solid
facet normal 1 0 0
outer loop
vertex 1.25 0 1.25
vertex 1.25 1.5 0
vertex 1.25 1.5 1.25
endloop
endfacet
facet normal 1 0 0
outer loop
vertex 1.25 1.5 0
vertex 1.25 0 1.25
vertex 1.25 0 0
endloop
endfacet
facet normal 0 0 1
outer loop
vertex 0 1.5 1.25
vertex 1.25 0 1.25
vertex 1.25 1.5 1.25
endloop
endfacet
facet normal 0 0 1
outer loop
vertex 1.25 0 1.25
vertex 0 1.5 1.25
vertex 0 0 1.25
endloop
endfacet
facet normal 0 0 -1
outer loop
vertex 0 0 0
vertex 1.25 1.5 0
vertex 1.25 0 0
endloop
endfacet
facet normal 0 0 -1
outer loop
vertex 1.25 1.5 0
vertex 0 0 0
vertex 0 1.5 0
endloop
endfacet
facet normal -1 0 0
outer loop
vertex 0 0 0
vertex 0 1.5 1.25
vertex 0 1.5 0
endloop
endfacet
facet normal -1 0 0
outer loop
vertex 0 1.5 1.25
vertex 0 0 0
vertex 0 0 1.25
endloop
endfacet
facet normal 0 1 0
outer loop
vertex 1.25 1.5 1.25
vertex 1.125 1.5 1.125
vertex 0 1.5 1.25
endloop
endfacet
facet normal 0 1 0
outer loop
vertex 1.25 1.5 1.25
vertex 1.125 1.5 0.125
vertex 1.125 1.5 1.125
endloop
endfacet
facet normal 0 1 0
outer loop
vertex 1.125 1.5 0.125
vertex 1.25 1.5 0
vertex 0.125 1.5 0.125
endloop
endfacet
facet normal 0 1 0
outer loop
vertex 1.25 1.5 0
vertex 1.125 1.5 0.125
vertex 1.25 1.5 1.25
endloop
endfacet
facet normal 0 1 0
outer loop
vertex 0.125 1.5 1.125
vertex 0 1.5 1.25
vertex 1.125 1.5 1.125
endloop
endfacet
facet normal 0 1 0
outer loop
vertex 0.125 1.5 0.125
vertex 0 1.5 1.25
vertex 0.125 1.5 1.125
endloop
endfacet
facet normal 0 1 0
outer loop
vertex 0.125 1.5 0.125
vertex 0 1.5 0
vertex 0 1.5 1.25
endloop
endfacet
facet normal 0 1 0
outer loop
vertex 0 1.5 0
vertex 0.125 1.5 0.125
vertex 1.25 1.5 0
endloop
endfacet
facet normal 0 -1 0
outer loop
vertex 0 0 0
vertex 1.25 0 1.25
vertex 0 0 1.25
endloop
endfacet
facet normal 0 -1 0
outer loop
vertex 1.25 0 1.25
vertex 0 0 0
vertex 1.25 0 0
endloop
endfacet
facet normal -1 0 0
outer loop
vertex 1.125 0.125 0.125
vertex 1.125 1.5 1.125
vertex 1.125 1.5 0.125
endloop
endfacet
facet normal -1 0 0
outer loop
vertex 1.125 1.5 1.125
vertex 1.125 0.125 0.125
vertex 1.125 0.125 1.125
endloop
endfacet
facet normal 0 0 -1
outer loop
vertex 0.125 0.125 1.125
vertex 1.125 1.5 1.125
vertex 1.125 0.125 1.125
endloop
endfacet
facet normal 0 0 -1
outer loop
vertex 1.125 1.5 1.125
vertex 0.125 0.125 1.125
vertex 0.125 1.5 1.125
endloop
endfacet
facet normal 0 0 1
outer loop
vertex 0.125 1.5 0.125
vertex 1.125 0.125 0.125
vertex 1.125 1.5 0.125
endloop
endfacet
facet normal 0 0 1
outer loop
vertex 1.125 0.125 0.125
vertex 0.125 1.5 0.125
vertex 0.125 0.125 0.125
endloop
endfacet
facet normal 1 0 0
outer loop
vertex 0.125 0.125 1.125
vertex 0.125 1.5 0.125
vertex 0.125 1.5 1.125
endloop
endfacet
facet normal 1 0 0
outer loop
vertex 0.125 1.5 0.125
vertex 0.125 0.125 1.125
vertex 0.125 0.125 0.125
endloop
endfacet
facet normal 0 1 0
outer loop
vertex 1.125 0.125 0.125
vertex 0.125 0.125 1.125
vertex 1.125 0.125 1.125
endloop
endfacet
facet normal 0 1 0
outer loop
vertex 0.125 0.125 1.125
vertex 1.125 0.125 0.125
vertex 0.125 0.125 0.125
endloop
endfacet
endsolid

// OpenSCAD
$fn=50;
module shoulderArmCollar(){
difference(){
cube([1.25,1.5,1.25]);
translate([0.125,.125,0.125])
cube([1,1.5,1]);
}
}
shoulderArmCollar();
